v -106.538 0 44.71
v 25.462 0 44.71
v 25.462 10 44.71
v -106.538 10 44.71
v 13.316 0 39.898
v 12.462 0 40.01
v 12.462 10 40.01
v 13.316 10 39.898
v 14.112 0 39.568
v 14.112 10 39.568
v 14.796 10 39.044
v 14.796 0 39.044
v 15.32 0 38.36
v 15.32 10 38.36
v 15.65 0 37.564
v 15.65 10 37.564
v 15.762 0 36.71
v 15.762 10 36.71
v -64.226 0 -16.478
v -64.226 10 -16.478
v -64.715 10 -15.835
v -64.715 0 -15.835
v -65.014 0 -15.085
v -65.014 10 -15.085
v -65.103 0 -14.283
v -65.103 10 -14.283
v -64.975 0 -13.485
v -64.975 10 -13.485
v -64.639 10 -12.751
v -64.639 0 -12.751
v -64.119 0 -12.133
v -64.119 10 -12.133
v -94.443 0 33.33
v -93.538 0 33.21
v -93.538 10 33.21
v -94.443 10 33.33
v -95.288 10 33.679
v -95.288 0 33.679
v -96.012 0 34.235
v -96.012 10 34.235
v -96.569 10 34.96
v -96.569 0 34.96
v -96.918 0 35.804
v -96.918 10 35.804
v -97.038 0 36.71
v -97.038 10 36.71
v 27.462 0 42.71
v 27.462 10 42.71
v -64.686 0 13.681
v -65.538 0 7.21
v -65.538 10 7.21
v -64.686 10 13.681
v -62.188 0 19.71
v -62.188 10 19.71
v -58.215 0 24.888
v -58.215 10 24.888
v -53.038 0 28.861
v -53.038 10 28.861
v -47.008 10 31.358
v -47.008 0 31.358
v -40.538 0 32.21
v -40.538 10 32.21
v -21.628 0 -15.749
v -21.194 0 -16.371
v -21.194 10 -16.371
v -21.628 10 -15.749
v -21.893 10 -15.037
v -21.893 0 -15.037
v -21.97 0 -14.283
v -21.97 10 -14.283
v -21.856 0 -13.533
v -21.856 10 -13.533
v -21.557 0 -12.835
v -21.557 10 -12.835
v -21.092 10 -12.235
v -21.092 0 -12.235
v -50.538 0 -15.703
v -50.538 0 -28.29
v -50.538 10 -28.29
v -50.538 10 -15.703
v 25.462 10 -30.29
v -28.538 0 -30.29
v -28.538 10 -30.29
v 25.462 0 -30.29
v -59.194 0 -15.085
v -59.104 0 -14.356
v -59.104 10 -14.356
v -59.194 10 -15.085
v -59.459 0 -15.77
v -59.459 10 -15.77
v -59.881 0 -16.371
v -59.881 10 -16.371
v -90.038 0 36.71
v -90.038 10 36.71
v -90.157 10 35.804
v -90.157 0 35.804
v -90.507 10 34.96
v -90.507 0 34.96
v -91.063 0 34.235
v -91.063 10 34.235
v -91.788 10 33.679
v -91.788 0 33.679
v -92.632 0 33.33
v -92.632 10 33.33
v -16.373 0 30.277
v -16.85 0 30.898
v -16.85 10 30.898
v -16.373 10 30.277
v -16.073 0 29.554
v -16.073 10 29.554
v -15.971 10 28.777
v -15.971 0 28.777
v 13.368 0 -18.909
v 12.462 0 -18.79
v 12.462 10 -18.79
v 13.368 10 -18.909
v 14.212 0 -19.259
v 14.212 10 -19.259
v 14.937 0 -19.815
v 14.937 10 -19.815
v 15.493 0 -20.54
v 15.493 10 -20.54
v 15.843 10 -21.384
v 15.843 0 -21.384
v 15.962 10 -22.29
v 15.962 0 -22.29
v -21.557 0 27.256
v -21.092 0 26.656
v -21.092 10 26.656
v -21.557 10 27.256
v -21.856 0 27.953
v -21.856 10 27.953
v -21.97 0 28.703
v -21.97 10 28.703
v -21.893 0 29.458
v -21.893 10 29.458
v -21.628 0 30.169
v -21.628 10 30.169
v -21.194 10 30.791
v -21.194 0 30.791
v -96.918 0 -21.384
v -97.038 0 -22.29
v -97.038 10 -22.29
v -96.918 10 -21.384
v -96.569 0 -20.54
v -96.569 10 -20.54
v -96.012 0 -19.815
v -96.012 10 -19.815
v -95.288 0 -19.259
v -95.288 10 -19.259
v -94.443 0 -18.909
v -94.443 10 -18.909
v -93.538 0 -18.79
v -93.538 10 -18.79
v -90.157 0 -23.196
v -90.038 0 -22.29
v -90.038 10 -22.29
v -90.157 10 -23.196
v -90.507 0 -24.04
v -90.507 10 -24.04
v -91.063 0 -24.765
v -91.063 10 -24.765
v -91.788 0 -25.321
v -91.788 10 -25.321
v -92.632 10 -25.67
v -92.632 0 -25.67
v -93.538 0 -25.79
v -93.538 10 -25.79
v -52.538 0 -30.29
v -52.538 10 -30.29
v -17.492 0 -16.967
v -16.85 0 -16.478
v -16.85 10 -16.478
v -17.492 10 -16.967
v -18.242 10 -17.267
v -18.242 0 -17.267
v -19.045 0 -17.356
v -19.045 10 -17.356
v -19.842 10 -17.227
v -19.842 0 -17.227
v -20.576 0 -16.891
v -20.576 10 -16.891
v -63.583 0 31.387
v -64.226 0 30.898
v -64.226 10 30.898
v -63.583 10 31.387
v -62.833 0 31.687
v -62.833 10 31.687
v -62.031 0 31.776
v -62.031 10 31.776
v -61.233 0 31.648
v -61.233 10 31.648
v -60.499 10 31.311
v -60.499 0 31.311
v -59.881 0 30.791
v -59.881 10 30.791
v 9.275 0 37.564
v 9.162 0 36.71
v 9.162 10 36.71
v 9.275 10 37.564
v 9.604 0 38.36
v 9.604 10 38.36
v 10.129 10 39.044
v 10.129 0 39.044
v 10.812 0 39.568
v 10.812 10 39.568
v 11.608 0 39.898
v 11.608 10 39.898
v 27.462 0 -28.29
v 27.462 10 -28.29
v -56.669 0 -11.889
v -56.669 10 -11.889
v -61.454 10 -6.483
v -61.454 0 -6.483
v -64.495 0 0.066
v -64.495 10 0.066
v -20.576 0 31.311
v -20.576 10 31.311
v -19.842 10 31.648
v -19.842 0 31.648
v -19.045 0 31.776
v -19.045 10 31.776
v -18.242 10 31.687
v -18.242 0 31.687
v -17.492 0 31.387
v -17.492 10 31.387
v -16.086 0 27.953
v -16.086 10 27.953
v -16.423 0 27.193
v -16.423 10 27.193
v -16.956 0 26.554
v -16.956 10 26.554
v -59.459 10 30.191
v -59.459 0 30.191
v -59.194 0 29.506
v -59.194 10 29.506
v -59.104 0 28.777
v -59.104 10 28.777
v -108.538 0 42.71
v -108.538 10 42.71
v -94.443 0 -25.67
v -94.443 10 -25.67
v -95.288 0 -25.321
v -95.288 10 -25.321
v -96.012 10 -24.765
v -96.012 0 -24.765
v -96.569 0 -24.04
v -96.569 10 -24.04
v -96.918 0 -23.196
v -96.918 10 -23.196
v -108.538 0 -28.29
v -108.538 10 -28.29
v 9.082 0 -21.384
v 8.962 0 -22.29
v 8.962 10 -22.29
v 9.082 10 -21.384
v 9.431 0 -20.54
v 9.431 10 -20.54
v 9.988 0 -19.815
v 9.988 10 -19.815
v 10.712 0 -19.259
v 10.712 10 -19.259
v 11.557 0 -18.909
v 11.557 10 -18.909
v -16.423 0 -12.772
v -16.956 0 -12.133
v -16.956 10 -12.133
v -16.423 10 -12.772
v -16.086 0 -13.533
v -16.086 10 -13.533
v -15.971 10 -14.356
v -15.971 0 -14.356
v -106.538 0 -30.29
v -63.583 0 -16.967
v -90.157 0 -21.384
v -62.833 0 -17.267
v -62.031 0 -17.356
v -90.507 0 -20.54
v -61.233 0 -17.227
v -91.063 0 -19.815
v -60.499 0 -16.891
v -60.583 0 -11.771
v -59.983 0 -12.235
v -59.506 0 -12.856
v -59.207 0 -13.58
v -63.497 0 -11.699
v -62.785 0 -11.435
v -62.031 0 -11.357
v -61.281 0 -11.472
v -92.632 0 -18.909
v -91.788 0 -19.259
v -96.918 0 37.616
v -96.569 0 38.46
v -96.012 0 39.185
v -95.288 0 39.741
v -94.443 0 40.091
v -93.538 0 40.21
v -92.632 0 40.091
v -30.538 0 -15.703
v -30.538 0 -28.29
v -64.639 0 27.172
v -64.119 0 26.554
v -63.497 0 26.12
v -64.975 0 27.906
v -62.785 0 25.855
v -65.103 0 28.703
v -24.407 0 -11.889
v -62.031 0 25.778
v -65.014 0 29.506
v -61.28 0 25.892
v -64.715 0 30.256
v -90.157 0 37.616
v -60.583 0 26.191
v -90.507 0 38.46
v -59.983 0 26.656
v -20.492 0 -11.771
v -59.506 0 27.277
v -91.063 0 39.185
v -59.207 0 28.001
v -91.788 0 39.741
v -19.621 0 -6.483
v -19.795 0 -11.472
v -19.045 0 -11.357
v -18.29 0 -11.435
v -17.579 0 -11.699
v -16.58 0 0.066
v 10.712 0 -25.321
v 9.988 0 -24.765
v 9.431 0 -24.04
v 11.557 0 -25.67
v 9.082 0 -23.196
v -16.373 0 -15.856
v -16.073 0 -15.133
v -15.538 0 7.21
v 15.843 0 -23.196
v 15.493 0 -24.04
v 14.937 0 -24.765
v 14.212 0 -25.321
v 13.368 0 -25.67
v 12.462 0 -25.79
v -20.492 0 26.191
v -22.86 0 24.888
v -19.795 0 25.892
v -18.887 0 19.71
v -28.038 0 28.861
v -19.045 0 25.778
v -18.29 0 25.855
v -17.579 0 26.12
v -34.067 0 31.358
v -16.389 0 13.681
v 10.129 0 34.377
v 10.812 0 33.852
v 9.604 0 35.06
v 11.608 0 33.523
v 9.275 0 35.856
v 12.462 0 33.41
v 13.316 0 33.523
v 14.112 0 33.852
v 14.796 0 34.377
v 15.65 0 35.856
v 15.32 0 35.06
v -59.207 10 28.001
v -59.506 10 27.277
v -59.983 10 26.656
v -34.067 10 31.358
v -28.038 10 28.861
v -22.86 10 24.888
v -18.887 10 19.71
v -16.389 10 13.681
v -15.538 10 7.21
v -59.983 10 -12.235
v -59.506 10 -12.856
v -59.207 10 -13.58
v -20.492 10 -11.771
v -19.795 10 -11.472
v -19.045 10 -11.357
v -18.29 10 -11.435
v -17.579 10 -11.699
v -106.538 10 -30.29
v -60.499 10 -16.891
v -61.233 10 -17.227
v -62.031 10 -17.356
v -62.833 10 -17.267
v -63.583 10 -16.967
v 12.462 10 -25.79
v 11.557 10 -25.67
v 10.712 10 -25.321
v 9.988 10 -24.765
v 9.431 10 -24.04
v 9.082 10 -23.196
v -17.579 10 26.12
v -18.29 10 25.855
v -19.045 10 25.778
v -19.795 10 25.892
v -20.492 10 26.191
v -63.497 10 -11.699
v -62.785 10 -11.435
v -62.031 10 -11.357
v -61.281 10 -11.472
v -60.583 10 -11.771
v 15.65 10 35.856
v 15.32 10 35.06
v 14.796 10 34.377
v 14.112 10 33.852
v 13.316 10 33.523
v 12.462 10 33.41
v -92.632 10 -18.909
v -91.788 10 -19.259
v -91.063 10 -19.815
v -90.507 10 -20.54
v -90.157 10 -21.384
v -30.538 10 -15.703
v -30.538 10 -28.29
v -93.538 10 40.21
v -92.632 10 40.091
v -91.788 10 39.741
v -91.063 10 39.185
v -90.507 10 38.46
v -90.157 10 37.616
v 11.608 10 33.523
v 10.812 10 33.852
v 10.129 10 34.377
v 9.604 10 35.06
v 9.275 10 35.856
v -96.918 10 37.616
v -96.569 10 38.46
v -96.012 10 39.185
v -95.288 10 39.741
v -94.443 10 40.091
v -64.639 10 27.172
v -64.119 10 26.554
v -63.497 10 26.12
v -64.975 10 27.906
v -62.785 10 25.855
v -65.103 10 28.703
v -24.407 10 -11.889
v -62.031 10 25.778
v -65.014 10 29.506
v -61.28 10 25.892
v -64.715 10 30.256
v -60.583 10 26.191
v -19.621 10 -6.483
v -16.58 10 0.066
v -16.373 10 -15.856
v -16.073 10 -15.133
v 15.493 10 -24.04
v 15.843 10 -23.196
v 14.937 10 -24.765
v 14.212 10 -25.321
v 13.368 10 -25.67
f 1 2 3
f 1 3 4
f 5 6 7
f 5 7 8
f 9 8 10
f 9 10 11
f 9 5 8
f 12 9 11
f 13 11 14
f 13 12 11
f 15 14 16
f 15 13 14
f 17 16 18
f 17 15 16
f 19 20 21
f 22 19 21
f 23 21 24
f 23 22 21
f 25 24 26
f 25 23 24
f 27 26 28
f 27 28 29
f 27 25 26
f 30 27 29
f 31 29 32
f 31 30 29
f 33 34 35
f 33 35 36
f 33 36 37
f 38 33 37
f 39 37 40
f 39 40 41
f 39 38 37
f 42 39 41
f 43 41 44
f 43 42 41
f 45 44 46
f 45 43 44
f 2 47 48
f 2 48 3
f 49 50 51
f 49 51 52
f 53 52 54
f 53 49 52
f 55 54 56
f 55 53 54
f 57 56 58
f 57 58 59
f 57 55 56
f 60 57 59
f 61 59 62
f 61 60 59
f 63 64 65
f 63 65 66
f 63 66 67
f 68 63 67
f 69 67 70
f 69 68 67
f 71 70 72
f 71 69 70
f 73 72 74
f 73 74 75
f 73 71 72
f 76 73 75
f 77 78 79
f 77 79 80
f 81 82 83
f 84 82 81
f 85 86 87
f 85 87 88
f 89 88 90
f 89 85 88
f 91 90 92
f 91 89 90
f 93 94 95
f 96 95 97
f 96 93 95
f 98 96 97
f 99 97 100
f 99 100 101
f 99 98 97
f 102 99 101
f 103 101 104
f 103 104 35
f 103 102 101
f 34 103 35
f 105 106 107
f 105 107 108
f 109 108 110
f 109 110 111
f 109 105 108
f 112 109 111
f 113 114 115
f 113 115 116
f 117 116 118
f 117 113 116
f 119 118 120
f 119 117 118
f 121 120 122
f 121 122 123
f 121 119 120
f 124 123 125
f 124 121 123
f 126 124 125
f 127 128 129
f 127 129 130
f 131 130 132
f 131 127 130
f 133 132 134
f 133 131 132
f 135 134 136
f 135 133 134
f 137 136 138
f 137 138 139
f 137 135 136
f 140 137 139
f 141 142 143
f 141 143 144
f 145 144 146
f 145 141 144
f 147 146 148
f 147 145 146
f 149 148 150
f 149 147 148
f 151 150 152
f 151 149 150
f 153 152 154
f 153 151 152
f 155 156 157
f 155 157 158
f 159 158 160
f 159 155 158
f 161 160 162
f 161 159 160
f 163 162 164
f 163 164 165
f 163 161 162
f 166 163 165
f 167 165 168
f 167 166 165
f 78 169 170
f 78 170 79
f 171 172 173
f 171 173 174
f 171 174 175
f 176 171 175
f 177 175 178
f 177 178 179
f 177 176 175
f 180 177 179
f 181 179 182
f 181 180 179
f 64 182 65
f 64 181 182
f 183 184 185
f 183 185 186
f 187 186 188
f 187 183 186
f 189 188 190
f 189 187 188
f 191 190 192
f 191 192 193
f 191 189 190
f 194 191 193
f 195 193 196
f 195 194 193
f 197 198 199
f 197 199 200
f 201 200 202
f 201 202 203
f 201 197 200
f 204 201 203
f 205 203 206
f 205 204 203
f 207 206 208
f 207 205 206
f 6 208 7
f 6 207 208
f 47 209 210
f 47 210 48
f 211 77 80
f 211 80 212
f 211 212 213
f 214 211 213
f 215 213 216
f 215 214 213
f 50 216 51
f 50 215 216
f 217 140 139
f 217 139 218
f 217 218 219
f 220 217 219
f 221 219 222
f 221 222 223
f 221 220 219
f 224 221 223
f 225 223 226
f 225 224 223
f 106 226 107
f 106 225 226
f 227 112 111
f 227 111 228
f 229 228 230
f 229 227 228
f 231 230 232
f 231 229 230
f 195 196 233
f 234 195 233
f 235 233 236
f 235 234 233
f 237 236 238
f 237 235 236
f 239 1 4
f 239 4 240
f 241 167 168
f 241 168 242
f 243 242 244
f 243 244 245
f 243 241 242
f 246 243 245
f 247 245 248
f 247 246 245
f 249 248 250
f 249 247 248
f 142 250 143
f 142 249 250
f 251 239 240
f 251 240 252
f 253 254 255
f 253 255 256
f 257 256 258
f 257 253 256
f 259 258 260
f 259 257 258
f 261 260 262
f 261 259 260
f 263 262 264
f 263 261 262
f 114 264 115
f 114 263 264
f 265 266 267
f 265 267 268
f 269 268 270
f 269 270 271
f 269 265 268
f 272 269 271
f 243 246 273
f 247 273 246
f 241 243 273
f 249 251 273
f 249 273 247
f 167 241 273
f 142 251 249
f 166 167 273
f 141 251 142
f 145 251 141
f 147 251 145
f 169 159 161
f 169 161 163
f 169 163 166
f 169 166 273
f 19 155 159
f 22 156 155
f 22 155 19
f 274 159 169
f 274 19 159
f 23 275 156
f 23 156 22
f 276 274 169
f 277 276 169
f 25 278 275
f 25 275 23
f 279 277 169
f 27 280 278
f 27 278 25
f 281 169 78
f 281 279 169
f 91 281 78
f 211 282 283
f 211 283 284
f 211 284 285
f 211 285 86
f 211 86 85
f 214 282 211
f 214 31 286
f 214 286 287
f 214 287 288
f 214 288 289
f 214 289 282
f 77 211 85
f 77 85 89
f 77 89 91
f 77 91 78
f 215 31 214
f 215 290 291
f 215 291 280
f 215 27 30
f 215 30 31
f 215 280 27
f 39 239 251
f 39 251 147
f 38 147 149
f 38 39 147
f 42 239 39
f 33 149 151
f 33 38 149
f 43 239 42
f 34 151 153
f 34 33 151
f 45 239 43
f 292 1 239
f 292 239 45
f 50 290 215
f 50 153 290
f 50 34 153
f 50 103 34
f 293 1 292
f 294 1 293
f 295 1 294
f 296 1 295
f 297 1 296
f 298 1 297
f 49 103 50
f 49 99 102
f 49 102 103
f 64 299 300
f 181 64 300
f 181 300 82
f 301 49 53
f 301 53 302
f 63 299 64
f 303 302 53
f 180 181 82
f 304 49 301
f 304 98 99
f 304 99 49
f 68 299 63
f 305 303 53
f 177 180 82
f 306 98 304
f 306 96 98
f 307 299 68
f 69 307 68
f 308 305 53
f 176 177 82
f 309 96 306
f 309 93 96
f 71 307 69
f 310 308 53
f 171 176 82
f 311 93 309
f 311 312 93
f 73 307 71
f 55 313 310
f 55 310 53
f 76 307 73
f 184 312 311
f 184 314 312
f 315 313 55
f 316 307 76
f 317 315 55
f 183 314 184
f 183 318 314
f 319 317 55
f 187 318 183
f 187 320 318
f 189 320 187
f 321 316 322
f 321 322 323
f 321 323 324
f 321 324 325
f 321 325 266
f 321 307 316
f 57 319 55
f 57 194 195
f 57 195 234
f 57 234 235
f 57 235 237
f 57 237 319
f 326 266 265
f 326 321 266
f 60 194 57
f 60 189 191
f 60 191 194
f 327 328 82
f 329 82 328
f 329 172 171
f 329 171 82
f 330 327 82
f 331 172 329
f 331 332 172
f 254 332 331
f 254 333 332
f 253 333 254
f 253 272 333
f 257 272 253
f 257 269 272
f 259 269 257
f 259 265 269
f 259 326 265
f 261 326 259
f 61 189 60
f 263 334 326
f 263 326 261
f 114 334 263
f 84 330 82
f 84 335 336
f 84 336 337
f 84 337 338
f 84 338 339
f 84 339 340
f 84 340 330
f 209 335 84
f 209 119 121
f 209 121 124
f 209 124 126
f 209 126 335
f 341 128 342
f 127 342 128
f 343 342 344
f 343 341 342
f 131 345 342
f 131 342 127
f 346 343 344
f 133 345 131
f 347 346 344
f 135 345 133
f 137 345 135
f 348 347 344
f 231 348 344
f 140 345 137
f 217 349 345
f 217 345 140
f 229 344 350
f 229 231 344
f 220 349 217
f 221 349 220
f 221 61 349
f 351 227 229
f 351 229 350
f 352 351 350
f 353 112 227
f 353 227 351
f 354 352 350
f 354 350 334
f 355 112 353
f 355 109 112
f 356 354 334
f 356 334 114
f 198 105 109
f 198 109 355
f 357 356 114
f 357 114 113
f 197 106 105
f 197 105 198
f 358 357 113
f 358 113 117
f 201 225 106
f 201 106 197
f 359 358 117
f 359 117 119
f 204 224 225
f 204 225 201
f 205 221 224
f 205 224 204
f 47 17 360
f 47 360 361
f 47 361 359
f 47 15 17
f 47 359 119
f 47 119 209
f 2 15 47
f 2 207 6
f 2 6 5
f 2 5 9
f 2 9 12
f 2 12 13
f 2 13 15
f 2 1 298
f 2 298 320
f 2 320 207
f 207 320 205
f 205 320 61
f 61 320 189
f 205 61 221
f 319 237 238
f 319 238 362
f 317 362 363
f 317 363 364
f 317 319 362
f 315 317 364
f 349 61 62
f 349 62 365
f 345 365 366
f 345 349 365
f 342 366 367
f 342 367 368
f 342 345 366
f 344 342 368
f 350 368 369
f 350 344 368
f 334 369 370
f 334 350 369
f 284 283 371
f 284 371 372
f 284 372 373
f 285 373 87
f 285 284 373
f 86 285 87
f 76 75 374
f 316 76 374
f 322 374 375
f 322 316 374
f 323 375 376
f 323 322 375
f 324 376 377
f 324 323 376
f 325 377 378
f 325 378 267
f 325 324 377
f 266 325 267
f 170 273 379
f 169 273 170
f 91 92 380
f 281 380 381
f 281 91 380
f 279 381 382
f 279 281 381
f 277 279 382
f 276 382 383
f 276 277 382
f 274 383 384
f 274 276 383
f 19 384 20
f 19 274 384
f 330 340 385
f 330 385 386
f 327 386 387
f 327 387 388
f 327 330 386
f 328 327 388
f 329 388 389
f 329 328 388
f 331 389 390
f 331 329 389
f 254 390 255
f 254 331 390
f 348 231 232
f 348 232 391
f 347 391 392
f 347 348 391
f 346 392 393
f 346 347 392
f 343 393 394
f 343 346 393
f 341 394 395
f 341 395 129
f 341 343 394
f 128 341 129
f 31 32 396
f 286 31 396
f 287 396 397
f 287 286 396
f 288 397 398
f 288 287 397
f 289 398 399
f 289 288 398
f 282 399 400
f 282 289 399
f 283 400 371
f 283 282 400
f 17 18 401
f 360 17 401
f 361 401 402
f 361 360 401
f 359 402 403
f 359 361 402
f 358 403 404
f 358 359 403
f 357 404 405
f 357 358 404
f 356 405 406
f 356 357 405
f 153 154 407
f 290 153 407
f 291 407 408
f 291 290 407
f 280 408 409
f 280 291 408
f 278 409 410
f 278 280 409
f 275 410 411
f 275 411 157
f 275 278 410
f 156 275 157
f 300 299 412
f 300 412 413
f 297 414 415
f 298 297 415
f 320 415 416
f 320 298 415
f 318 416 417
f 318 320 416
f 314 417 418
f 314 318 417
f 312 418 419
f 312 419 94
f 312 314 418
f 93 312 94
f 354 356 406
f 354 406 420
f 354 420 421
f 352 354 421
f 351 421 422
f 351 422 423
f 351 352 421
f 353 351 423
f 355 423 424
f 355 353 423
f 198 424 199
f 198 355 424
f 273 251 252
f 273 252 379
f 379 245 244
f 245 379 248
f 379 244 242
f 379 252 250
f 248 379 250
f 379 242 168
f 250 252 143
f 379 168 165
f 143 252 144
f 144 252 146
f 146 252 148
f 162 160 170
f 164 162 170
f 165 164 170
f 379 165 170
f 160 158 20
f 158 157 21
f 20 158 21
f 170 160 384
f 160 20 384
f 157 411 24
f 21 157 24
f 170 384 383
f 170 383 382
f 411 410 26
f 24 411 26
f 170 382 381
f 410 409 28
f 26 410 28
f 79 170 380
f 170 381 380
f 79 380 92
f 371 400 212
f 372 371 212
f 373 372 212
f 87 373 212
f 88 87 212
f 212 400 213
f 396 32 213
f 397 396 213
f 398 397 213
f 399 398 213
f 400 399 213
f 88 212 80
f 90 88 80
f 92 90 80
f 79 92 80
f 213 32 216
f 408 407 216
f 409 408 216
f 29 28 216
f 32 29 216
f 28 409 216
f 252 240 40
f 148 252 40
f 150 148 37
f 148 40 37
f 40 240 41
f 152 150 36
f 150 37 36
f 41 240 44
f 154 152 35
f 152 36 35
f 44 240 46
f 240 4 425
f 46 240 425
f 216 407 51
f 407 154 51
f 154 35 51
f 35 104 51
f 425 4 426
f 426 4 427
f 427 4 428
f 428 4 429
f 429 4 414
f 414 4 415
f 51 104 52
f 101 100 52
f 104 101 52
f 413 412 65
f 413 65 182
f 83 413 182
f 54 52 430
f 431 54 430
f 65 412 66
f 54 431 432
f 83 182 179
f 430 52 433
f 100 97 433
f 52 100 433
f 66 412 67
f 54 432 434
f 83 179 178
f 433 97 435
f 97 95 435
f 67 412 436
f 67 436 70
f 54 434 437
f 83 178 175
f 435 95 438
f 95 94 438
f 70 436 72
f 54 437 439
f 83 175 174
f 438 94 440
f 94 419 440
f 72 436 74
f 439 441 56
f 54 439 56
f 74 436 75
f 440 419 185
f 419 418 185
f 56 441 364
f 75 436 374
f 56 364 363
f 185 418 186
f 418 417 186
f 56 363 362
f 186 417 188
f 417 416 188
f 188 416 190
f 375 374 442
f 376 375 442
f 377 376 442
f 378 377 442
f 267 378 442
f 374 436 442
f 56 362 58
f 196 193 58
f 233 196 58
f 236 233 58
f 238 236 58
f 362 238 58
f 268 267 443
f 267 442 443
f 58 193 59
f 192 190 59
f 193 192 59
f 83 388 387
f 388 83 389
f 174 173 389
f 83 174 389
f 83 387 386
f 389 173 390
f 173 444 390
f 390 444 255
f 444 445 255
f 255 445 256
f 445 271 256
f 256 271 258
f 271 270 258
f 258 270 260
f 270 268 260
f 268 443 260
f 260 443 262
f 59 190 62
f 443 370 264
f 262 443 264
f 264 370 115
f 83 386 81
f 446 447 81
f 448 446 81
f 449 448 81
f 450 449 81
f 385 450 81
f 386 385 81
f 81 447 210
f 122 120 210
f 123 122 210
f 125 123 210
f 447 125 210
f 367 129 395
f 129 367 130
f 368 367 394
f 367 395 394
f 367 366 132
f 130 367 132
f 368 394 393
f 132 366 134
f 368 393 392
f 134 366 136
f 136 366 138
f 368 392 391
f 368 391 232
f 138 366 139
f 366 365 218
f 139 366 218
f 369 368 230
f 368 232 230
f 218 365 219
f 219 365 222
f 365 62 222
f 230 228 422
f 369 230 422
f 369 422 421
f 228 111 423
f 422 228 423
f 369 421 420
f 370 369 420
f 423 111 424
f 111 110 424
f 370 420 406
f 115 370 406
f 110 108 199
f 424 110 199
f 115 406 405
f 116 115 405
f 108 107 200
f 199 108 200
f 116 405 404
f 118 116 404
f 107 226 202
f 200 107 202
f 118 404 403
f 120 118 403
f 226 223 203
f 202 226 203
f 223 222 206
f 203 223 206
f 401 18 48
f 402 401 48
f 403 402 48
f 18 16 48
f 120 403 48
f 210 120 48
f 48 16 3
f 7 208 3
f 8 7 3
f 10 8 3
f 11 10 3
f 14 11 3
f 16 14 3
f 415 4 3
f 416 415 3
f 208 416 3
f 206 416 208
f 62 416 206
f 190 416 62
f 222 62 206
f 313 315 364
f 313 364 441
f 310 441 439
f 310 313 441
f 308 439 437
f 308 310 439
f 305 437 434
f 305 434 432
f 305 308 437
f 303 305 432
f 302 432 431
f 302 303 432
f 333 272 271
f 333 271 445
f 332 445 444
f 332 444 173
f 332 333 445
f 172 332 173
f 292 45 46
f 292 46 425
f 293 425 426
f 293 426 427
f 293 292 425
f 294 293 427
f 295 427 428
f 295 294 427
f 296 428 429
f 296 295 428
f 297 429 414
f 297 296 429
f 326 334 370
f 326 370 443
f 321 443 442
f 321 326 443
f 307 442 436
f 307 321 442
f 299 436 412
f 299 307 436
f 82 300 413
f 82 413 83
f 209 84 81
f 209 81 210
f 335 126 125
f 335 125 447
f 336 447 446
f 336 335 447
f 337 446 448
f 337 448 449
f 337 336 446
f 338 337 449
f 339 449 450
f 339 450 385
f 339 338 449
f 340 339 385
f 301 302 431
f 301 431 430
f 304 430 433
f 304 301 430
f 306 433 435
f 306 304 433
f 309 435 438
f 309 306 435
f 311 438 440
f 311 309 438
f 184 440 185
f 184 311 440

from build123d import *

# Parameters (mm, degrees)
F1_DEPTH = 10


# Not quite as in the source:
# - ends of sketch curves that miss each other by under 0.0002 mm in the source are joined


with BuildPart() as f1:
    # F0 (on Front) → F1 (new body)
    with BuildSketch(Plane.XZ):
        with BuildLine():
            Line((-28.537618, -30.289698), (25.462382, -30.289698))
            Line((25.462382, -30.289698), (27.462382, -28.289698))
            Line((27.462382, -28.289698), (27.462382, 42.710302))
            Line((27.462382, 42.710302), (25.462382, 44.710302))
            Line((25.462382, 44.710302), (-106.537618, 44.710302))
            Line((-106.537618, 44.710302), (-108.537618, 42.710302))
            Line((-108.537618, 42.710302), (-108.537618, -28.289698))
            Line((-108.537618, -28.289698), (-106.537618, -30.289698))
            Line((-106.537618, -30.289698), (-52.537618, -30.289698))
            Line((-52.537618, -30.289698), (-50.537618, -28.289698))
            Line((-50.537618, -28.289698), (-50.537618, -21.6037570684))
            ThreePointArc((-50.537618, -21.6037570684), (-55.4409257201, -19.4006246843), (-59.881294185, -16.3708809994))
            ThreePointArc((-59.881294185, -16.3708809994), (-62.0305817628, -17.3555463136), (-64.2256943436, -16.4777743436))
            ThreePointArc((-64.2256943436, -16.4777743436), (-65.1034663136, -14.2826617628), (-64.1188009994, -12.133374185))
            ThreePointArc((-64.1188009994, -12.133374185), (-69.2558707453, -3.0615994432), (-71.037618, 7.210302))
            ThreePointArc((-71.037618, 7.210302), (-69.2558706203, 17.4822037925), (-64.1188005289, 26.5539787586))
            ThreePointArc((-64.1188005289, 26.5539787586), (-65.1034663058, 28.7032664454), (-64.2256943436, 30.8983793436))
            ThreePointArc((-64.2256943436, 30.8983793436), (-62.0305813759, 31.7761513041), (-59.8812936652, 30.7914854258))
            ThreePointArc((-59.8812936652, 30.7914854258), (-50.8095191267, 35.9285548585), (-40.537618, 37.710302))
            ThreePointArc((-40.537618, 37.710302), (-30.265716524, 35.9285547335), (-21.1939417612, 30.7914849552))
            ThreePointArc((-21.1939417612, 30.7914849552), (-19.0446539415, 31.7761512963), (-16.8495406564, 30.8983793436))
            ThreePointArc((-16.8495406564, 30.8983793436), (-16.1992224025, 29.9251092971), (-15.970861, 28.777059))
            ThreePointArc((-15.970861, 28.777059), (-16.2283003475, 27.5611802778), (-16.9564350448, 26.5539782388))
            ThreePointArc((-16.9564350448, 26.5539782388), (-11.8193652665, 17.482203476), (-10.037618, 7.210302))
            ThreePointArc((-10.037618, 7.210302), (-11.8193651415, -3.0615991267), (-16.9564345742, -12.1333736652))
            ThreePointArc((-16.9564345742, -12.1333736652), (-16.2283002188, -13.140575568), (-15.970861, -14.356454))
            ThreePointArc((-15.970861, -14.356454), (-16.1992224025, -15.5045042971), (-16.8495406564, -16.4777743436))
            ThreePointArc((-16.8495406564, -16.4777743436), (-19.0446535546, -17.3555463058), (-21.1939412414, -16.3708805289))
            ThreePointArc((-21.1939412414, -16.3708805289), (-25.6343099562, -19.4006245031), (-30.537618, -21.6037570684))
            Line((-30.537618, -21.6037570684), (-30.537618, -28.289698))
            Line((-30.537618, -28.289698), (-28.537618, -30.289698))
        make_face()
        with BuildLine():
            ThreePointArc((-93.537618, -18.789698), (-91.0627442658, -19.8148242658), (-90.037618, -22.289698))
            ThreePointArc((-90.037618, -22.289698), (-91.0627442658, -24.7645717342), (-93.537618, -25.789698))
            ThreePointArc((-93.537618, -25.789698), (-96.0124917342, -24.7645717342), (-97.037618, -22.289698))
            ThreePointArc((-97.037618, -22.289698), (-96.0124917342, -19.8148242658), (-93.537618, -18.789698))
        make_face(mode=Mode.SUBTRACT)
        with BuildLine():
            ThreePointArc((12.462382, -18.789698), (14.9372557342, -19.8148242658), (15.962382, -22.289698))
            ThreePointArc((15.962382, -22.289698), (14.9372557342, -24.7645717342), (12.462382, -25.789698))
            ThreePointArc((12.462382, -25.789698), (9.9875082658, -24.7645717342), (8.962382, -22.289698))
            ThreePointArc((8.962382, -22.289698), (9.9875082658, -19.8148242658), (12.462382, -18.789698))
        make_face(mode=Mode.SUBTRACT)
        with BuildLine():
            ThreePointArc((-93.537618, 40.210302), (-91.0627442658, 39.1851757342), (-90.037618, 36.710302))
            ThreePointArc((-90.037618, 36.710302), (-91.0627442658, 34.2354282658), (-93.537618, 33.210302))
            ThreePointArc((-93.537618, 33.210302), (-96.0124917342, 34.2354282658), (-97.037618, 36.710302))
            ThreePointArc((-97.037618, 36.710302), (-96.0124917342, 39.1851757342), (-93.537618, 40.210302))
        make_face(mode=Mode.SUBTRACT)
        with BuildLine():
            ThreePointArc((12.462382, 33.410302), (10.1289296221, 34.3768496221), (9.162382, 36.710302))
            ThreePointArc((9.162382, 36.710302), (10.1289296221, 39.0437543779), (12.462382, 40.010302))
            ThreePointArc((12.462382, 40.010302), (14.7958343779, 39.0437543779), (15.762382, 36.710302))
            ThreePointArc((15.762382, 36.710302), (14.7958343779, 34.3768496221), (12.462382, 33.410302))
        make_face(mode=Mode.SUBTRACT)
        with BuildLine():
            ThreePointArc((-40.537618, 32.210302), (-22.8599484703, 24.8879715297), (-15.537618, 7.210302))
            Line((-15.537618, 7.210302), (-10.037618, 7.210302))
            ThreePointArc((-10.037618, 7.210302), (-11.8193652665, 17.482203476), (-16.9564350448, 26.5539782388))
            ThreePointArc((-16.9564350448, 26.5539782388), (-19.0446539415, 25.7779667037), (-21.0921813436, 26.6557386564))
            ThreePointArc((-21.0921813436, 26.6557386564), (-21.9699532963, 28.7032660585), (-21.1939417612, 30.7914849552))
            ThreePointArc((-21.1939417612, 30.7914849552), (-30.265716524, 35.9285547335), (-40.537618, 37.710302))
            Line((-40.537618, 37.710302), (-40.537618, 32.210302))
        make_face()
        with BuildLine():
            ThreePointArc((-65.537618, 7.210302), (-58.2152875297, 24.8879715297), (-40.537618, 32.210302))
            Line((-40.537618, 32.210302), (-40.537618, 37.710302))
            ThreePointArc((-40.537618, 37.710302), (-50.8095191267, 35.9285548585), (-59.8812936652, 30.7914854258))
            ThreePointArc((-59.8812936652, 30.7914854258), (-59.3053347894, 29.8565864419), (-59.104374, 28.777059))
            ThreePointArc((-59.104374, 28.777059), (-59.3327354025, 27.6290087029), (-59.9830536564, 26.6557386564))
            ThreePointArc((-59.9830536564, 26.6557386564), (-62.0305814454, 25.7779666942), (-64.1188005289, 26.5539787586))
            ThreePointArc((-64.1188005289, 26.5539787586), (-69.2558706203, 17.4822037925), (-71.037618, 7.210302))
            Line((-71.037618, 7.210302), (-65.537618, 7.210302))
        make_face()
        with BuildLine():
            ThreePointArc((-59.881294185, -16.3708809994), (-55.4409257201, -19.4006246843), (-50.537618, -21.6037570684))
            Line((-50.537618, -21.6037570684), (-50.537618, -15.702576))
            ThreePointArc((-50.537618, -15.702576), (-61.4541187154, -6.4827618582), (-65.537618, 7.210302))
            Line((-65.537618, 7.210302), (-71.037618, 7.210302))
            ThreePointArc((-71.037618, 7.210302), (-69.2558707453, -3.0615994432), (-64.1188009994, -12.133374185))
            ThreePointArc((-64.1188009994, -12.133374185), (-62.0305817628, -11.3573616864), (-59.9830536564, -12.2351336564))
            ThreePointArc((-59.9830536564, -12.2351336564), (-59.3327354025, -13.2084037029), (-59.104374, -14.356454))
            ThreePointArc((-59.104374, -14.356454), (-59.3053349287, -15.435981803), (-59.881294185, -16.3708809994))
        make_face()
        with BuildLine():
            Line((-30.537618, -15.702576), (-30.537618, -21.6037570684))
            ThreePointArc((-30.537618, -21.6037570684), (-25.6343099562, -19.4006245031), (-21.1939412414, -16.3708805289))
            ThreePointArc((-21.1939412414, -16.3708805289), (-21.9699533058, -14.2826614454), (-21.0921813436, -12.2351336564))
            ThreePointArc((-21.0921813436, -12.2351336564), (-19.0446536241, -11.3573616959), (-16.9564345742, -12.1333736652))
            ThreePointArc((-16.9564345742, -12.1333736652), (-11.8193651415, -3.0615991267), (-10.037618, 7.210302))
            Line((-10.037618, 7.210302), (-15.537618, 7.210302))
            ThreePointArc((-15.537618, 7.210302), (-19.6211172846, -6.4827618582), (-30.537618, -15.702576))
        make_face()
    extrude(amount=-F1_DEPTH)


solid = f1.part
